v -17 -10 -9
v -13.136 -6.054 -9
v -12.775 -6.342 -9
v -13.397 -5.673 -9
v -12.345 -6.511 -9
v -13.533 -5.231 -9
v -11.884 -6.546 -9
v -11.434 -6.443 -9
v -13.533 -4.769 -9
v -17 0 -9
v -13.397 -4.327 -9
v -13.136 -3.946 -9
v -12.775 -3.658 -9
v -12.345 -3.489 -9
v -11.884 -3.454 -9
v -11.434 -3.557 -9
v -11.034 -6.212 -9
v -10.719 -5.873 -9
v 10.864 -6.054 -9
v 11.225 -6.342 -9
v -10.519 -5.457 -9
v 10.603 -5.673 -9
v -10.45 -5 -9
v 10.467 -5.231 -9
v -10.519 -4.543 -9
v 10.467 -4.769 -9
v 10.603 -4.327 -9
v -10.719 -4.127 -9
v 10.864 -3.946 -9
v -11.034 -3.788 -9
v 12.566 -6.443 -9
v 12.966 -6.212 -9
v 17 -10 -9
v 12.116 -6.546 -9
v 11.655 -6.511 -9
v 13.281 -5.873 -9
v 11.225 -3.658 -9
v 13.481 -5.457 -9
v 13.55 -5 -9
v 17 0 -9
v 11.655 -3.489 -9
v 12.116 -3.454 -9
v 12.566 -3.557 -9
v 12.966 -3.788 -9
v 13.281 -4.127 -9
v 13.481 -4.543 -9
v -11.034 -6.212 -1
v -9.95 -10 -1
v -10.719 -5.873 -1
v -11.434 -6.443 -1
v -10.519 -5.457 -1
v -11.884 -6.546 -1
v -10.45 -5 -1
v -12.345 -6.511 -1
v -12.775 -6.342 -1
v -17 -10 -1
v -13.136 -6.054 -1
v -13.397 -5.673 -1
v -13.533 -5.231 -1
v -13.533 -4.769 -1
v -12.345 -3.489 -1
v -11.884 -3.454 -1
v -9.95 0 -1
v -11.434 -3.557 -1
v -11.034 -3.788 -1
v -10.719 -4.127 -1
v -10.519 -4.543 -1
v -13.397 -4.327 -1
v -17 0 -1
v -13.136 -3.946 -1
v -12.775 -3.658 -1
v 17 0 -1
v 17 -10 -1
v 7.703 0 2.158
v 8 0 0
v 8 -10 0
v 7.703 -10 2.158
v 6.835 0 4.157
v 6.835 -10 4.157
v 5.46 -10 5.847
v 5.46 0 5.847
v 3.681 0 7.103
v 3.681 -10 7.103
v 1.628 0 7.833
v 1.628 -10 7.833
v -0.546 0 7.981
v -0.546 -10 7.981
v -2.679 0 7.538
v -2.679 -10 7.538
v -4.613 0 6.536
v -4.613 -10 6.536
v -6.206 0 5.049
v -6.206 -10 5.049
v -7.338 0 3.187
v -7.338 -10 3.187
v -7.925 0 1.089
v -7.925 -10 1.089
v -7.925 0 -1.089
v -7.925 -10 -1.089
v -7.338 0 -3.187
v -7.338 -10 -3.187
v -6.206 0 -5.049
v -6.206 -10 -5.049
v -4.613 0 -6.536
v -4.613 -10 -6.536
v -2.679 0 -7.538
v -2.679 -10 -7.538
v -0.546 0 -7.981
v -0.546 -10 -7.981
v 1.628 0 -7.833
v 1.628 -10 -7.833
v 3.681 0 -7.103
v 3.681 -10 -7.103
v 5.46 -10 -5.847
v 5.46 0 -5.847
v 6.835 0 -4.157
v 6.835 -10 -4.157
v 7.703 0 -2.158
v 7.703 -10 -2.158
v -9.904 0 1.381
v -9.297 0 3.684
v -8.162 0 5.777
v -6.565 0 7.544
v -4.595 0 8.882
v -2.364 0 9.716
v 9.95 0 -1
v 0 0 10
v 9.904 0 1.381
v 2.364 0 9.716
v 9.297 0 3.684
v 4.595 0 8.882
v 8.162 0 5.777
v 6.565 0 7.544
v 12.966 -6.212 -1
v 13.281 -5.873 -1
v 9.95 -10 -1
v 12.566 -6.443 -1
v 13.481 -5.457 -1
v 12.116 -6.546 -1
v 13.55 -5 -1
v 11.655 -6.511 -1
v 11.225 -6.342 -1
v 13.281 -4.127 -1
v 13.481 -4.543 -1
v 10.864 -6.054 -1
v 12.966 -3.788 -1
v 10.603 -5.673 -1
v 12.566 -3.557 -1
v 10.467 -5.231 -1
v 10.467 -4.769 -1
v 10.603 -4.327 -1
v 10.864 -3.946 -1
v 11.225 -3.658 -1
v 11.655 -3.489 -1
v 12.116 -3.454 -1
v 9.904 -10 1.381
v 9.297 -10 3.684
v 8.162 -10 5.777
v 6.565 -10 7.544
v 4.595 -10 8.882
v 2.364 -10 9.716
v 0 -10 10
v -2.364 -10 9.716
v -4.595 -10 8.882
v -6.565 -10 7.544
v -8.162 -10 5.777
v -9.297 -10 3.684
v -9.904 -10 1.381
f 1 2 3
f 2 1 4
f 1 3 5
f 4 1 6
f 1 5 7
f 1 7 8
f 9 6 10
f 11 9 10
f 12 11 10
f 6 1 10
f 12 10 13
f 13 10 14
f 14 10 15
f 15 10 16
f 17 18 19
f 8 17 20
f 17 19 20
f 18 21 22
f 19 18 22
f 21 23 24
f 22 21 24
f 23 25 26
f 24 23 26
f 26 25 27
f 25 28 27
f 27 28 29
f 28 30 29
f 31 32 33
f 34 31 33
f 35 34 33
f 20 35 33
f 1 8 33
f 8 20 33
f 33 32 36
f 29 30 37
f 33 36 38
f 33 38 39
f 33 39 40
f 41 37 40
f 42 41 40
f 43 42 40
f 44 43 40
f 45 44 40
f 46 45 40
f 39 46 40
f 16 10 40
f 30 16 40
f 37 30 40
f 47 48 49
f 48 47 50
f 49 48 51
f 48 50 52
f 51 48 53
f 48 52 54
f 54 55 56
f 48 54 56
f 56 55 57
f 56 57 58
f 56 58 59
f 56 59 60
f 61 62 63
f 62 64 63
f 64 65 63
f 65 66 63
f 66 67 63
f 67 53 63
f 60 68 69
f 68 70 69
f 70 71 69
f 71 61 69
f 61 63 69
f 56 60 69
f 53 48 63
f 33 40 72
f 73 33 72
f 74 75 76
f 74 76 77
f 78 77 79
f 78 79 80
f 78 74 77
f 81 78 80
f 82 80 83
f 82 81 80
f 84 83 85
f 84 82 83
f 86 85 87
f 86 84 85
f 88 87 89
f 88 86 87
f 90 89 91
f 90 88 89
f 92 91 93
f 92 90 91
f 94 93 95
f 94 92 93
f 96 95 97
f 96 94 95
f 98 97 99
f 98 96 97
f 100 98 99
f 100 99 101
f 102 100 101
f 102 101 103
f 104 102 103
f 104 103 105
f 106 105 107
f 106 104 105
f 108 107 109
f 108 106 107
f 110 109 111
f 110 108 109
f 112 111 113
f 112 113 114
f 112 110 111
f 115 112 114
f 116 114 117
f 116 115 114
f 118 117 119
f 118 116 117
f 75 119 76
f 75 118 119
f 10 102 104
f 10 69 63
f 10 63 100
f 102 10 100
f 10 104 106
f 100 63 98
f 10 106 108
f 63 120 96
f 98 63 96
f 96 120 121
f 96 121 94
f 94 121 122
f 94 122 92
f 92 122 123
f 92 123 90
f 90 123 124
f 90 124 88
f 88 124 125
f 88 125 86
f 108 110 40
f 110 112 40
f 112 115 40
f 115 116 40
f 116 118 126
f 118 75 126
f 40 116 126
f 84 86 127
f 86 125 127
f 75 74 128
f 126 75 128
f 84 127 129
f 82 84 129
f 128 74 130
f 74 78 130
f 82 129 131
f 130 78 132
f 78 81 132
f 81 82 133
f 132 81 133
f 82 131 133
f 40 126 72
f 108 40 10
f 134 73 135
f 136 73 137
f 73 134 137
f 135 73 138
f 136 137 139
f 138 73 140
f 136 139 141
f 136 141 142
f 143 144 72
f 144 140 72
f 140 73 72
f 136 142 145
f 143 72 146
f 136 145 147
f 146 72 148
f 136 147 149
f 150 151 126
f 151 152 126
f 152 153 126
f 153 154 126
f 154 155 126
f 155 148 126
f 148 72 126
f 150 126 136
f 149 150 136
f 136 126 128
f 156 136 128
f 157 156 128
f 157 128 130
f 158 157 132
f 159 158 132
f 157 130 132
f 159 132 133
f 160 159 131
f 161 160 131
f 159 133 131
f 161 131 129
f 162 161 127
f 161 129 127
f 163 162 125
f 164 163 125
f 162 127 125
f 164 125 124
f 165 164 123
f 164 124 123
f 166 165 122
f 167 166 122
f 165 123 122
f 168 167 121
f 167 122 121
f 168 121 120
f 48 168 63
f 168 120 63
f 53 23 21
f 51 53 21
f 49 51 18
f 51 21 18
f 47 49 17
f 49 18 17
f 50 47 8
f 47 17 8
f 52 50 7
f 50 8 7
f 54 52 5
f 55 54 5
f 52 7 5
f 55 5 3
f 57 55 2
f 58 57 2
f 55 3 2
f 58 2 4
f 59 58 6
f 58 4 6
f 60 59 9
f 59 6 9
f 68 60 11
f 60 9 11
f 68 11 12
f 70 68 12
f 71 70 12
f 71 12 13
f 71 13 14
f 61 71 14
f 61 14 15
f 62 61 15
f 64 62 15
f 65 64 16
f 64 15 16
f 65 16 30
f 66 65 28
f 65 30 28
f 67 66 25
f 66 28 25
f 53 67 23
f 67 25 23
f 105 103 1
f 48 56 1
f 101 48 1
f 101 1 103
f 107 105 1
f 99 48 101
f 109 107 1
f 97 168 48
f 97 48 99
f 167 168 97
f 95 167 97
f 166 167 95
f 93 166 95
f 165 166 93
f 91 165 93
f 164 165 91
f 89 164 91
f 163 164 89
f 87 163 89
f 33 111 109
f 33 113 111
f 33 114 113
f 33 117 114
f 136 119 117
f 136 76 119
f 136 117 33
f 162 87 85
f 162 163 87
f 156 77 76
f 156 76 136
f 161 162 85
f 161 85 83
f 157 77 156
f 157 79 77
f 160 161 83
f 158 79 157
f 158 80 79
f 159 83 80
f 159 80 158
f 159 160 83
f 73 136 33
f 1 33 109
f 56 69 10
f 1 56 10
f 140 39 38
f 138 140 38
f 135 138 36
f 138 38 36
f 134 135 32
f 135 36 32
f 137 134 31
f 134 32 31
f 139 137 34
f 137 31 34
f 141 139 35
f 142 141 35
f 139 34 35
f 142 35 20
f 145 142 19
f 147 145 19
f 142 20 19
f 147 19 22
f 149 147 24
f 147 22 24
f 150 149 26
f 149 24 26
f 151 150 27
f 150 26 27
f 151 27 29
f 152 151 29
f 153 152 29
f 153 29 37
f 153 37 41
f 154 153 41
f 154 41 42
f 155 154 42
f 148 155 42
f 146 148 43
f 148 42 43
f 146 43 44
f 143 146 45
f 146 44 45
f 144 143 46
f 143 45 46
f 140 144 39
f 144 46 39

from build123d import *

# Parameters (mm, degrees)
F0_R     = 8
F1_DEPTH = 10
F2_R     = 1.55
F3_DEPTH = 8


with BuildPart() as f1:
    # F0 (on Front) → F1 (new body)
    with BuildSketch(Plane.XZ):
        with BuildLine():
            Line((-17, -1), (-17, -9))
            Line((-17, -9), (17, -9))
            Line((17, -9), (17, -1))
            Line((17, -1), (9.949874, -1))
            ThreePointArc((9.949874, -1), (0, 10), (-9.949874, -1))
            Line((-9.949874, -1), (-17, -1))
        make_face()
        Circle(F0_R, mode=Mode.SUBTRACT)
    extrude(amount=F1_DEPTH)

    # F2 (on face) → F3 (cut, through all)
    with BuildSketch(Plane(origin=(0, 0, -9), x_dir=(1, 0, 0), z_dir=(0, 0, -1))):
        with Locations((-12, 5)):
            Circle(F2_R)
        with Locations((12, 5)):
            Circle(F2_R)
    extrude(amount=-F3_DEPTH, mode=Mode.SUBTRACT)


solid = f1.part
